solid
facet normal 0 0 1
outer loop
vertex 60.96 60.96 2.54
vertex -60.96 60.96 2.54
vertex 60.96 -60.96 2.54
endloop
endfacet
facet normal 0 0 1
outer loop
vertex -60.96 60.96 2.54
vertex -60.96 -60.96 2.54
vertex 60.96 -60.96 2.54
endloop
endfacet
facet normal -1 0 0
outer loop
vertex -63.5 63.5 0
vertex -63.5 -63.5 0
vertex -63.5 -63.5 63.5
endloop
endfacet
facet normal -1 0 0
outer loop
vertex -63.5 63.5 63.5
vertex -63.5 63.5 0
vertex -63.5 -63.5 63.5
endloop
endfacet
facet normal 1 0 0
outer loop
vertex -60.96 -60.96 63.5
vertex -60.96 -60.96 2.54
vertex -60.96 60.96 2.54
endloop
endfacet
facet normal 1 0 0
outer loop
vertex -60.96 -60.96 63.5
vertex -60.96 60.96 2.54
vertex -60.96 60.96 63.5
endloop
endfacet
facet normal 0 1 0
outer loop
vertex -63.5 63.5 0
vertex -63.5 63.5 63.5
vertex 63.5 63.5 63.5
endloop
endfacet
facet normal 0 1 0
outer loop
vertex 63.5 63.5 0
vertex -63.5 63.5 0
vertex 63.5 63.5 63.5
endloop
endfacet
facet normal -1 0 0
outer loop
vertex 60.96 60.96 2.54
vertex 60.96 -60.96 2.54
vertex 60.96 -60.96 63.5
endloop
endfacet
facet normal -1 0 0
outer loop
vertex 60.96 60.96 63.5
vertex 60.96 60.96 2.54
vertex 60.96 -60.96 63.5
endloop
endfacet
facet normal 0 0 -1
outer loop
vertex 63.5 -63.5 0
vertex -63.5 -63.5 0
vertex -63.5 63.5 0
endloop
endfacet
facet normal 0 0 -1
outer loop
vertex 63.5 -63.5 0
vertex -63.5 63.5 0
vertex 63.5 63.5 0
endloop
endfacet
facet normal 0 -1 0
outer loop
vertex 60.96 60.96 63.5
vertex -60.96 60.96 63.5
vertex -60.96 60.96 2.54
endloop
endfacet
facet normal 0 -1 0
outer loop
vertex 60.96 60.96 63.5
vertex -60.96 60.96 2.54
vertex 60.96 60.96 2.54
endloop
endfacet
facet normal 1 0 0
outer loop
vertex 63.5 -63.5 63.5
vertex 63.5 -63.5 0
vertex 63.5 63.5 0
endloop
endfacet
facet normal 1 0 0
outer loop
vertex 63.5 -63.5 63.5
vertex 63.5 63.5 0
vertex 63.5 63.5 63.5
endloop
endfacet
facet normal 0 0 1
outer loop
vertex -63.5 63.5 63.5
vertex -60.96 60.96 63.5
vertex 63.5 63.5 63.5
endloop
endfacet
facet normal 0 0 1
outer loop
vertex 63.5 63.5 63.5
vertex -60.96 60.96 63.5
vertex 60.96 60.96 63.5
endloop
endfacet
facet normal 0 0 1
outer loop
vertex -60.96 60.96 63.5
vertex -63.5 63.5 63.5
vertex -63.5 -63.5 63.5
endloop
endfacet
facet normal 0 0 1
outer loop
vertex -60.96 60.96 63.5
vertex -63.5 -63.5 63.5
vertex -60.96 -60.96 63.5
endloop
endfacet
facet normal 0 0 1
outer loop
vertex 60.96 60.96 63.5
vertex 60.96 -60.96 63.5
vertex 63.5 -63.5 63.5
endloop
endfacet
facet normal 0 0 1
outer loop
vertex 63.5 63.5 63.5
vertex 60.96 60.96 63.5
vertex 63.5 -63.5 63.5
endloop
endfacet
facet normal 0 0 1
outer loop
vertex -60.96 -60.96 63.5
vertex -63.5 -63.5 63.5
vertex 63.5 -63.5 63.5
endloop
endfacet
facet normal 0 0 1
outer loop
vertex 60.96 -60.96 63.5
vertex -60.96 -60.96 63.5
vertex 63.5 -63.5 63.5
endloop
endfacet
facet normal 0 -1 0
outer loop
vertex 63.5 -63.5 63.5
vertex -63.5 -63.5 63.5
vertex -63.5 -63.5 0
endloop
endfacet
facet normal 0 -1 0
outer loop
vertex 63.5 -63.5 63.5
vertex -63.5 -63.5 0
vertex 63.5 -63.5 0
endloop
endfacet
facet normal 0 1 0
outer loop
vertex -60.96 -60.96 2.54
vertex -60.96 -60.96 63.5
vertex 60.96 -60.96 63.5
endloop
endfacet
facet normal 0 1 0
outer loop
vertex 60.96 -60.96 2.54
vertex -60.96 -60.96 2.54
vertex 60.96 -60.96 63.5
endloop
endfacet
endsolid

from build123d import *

# Parameters (mm, degrees)
F0_W          = 127
F0_H          = 63.5
F1_DEPTH      = 63.5
F1_DEPTH_BACK = 63.5
F2_T          = -2.54


with BuildPart() as f1:
    # F0 (on Front) → F1 (new body, two sides)
    with BuildSketch(Plane.XZ) as f1_sk:
        with Locations((0, 31.75)):
            Rectangle(F0_W, F0_H)
    extrude(amount=F1_DEPTH)
    extrude(f1_sk.sketch, amount=-F1_DEPTH_BACK)

    # F2
    f2_openings = [f1.faces().sort_by_distance(p)[0] for p in [
        (0, 0, 63.5),
    ]]
    offset(amount=F2_T, openings=f2_openings)


solid = f1.part
